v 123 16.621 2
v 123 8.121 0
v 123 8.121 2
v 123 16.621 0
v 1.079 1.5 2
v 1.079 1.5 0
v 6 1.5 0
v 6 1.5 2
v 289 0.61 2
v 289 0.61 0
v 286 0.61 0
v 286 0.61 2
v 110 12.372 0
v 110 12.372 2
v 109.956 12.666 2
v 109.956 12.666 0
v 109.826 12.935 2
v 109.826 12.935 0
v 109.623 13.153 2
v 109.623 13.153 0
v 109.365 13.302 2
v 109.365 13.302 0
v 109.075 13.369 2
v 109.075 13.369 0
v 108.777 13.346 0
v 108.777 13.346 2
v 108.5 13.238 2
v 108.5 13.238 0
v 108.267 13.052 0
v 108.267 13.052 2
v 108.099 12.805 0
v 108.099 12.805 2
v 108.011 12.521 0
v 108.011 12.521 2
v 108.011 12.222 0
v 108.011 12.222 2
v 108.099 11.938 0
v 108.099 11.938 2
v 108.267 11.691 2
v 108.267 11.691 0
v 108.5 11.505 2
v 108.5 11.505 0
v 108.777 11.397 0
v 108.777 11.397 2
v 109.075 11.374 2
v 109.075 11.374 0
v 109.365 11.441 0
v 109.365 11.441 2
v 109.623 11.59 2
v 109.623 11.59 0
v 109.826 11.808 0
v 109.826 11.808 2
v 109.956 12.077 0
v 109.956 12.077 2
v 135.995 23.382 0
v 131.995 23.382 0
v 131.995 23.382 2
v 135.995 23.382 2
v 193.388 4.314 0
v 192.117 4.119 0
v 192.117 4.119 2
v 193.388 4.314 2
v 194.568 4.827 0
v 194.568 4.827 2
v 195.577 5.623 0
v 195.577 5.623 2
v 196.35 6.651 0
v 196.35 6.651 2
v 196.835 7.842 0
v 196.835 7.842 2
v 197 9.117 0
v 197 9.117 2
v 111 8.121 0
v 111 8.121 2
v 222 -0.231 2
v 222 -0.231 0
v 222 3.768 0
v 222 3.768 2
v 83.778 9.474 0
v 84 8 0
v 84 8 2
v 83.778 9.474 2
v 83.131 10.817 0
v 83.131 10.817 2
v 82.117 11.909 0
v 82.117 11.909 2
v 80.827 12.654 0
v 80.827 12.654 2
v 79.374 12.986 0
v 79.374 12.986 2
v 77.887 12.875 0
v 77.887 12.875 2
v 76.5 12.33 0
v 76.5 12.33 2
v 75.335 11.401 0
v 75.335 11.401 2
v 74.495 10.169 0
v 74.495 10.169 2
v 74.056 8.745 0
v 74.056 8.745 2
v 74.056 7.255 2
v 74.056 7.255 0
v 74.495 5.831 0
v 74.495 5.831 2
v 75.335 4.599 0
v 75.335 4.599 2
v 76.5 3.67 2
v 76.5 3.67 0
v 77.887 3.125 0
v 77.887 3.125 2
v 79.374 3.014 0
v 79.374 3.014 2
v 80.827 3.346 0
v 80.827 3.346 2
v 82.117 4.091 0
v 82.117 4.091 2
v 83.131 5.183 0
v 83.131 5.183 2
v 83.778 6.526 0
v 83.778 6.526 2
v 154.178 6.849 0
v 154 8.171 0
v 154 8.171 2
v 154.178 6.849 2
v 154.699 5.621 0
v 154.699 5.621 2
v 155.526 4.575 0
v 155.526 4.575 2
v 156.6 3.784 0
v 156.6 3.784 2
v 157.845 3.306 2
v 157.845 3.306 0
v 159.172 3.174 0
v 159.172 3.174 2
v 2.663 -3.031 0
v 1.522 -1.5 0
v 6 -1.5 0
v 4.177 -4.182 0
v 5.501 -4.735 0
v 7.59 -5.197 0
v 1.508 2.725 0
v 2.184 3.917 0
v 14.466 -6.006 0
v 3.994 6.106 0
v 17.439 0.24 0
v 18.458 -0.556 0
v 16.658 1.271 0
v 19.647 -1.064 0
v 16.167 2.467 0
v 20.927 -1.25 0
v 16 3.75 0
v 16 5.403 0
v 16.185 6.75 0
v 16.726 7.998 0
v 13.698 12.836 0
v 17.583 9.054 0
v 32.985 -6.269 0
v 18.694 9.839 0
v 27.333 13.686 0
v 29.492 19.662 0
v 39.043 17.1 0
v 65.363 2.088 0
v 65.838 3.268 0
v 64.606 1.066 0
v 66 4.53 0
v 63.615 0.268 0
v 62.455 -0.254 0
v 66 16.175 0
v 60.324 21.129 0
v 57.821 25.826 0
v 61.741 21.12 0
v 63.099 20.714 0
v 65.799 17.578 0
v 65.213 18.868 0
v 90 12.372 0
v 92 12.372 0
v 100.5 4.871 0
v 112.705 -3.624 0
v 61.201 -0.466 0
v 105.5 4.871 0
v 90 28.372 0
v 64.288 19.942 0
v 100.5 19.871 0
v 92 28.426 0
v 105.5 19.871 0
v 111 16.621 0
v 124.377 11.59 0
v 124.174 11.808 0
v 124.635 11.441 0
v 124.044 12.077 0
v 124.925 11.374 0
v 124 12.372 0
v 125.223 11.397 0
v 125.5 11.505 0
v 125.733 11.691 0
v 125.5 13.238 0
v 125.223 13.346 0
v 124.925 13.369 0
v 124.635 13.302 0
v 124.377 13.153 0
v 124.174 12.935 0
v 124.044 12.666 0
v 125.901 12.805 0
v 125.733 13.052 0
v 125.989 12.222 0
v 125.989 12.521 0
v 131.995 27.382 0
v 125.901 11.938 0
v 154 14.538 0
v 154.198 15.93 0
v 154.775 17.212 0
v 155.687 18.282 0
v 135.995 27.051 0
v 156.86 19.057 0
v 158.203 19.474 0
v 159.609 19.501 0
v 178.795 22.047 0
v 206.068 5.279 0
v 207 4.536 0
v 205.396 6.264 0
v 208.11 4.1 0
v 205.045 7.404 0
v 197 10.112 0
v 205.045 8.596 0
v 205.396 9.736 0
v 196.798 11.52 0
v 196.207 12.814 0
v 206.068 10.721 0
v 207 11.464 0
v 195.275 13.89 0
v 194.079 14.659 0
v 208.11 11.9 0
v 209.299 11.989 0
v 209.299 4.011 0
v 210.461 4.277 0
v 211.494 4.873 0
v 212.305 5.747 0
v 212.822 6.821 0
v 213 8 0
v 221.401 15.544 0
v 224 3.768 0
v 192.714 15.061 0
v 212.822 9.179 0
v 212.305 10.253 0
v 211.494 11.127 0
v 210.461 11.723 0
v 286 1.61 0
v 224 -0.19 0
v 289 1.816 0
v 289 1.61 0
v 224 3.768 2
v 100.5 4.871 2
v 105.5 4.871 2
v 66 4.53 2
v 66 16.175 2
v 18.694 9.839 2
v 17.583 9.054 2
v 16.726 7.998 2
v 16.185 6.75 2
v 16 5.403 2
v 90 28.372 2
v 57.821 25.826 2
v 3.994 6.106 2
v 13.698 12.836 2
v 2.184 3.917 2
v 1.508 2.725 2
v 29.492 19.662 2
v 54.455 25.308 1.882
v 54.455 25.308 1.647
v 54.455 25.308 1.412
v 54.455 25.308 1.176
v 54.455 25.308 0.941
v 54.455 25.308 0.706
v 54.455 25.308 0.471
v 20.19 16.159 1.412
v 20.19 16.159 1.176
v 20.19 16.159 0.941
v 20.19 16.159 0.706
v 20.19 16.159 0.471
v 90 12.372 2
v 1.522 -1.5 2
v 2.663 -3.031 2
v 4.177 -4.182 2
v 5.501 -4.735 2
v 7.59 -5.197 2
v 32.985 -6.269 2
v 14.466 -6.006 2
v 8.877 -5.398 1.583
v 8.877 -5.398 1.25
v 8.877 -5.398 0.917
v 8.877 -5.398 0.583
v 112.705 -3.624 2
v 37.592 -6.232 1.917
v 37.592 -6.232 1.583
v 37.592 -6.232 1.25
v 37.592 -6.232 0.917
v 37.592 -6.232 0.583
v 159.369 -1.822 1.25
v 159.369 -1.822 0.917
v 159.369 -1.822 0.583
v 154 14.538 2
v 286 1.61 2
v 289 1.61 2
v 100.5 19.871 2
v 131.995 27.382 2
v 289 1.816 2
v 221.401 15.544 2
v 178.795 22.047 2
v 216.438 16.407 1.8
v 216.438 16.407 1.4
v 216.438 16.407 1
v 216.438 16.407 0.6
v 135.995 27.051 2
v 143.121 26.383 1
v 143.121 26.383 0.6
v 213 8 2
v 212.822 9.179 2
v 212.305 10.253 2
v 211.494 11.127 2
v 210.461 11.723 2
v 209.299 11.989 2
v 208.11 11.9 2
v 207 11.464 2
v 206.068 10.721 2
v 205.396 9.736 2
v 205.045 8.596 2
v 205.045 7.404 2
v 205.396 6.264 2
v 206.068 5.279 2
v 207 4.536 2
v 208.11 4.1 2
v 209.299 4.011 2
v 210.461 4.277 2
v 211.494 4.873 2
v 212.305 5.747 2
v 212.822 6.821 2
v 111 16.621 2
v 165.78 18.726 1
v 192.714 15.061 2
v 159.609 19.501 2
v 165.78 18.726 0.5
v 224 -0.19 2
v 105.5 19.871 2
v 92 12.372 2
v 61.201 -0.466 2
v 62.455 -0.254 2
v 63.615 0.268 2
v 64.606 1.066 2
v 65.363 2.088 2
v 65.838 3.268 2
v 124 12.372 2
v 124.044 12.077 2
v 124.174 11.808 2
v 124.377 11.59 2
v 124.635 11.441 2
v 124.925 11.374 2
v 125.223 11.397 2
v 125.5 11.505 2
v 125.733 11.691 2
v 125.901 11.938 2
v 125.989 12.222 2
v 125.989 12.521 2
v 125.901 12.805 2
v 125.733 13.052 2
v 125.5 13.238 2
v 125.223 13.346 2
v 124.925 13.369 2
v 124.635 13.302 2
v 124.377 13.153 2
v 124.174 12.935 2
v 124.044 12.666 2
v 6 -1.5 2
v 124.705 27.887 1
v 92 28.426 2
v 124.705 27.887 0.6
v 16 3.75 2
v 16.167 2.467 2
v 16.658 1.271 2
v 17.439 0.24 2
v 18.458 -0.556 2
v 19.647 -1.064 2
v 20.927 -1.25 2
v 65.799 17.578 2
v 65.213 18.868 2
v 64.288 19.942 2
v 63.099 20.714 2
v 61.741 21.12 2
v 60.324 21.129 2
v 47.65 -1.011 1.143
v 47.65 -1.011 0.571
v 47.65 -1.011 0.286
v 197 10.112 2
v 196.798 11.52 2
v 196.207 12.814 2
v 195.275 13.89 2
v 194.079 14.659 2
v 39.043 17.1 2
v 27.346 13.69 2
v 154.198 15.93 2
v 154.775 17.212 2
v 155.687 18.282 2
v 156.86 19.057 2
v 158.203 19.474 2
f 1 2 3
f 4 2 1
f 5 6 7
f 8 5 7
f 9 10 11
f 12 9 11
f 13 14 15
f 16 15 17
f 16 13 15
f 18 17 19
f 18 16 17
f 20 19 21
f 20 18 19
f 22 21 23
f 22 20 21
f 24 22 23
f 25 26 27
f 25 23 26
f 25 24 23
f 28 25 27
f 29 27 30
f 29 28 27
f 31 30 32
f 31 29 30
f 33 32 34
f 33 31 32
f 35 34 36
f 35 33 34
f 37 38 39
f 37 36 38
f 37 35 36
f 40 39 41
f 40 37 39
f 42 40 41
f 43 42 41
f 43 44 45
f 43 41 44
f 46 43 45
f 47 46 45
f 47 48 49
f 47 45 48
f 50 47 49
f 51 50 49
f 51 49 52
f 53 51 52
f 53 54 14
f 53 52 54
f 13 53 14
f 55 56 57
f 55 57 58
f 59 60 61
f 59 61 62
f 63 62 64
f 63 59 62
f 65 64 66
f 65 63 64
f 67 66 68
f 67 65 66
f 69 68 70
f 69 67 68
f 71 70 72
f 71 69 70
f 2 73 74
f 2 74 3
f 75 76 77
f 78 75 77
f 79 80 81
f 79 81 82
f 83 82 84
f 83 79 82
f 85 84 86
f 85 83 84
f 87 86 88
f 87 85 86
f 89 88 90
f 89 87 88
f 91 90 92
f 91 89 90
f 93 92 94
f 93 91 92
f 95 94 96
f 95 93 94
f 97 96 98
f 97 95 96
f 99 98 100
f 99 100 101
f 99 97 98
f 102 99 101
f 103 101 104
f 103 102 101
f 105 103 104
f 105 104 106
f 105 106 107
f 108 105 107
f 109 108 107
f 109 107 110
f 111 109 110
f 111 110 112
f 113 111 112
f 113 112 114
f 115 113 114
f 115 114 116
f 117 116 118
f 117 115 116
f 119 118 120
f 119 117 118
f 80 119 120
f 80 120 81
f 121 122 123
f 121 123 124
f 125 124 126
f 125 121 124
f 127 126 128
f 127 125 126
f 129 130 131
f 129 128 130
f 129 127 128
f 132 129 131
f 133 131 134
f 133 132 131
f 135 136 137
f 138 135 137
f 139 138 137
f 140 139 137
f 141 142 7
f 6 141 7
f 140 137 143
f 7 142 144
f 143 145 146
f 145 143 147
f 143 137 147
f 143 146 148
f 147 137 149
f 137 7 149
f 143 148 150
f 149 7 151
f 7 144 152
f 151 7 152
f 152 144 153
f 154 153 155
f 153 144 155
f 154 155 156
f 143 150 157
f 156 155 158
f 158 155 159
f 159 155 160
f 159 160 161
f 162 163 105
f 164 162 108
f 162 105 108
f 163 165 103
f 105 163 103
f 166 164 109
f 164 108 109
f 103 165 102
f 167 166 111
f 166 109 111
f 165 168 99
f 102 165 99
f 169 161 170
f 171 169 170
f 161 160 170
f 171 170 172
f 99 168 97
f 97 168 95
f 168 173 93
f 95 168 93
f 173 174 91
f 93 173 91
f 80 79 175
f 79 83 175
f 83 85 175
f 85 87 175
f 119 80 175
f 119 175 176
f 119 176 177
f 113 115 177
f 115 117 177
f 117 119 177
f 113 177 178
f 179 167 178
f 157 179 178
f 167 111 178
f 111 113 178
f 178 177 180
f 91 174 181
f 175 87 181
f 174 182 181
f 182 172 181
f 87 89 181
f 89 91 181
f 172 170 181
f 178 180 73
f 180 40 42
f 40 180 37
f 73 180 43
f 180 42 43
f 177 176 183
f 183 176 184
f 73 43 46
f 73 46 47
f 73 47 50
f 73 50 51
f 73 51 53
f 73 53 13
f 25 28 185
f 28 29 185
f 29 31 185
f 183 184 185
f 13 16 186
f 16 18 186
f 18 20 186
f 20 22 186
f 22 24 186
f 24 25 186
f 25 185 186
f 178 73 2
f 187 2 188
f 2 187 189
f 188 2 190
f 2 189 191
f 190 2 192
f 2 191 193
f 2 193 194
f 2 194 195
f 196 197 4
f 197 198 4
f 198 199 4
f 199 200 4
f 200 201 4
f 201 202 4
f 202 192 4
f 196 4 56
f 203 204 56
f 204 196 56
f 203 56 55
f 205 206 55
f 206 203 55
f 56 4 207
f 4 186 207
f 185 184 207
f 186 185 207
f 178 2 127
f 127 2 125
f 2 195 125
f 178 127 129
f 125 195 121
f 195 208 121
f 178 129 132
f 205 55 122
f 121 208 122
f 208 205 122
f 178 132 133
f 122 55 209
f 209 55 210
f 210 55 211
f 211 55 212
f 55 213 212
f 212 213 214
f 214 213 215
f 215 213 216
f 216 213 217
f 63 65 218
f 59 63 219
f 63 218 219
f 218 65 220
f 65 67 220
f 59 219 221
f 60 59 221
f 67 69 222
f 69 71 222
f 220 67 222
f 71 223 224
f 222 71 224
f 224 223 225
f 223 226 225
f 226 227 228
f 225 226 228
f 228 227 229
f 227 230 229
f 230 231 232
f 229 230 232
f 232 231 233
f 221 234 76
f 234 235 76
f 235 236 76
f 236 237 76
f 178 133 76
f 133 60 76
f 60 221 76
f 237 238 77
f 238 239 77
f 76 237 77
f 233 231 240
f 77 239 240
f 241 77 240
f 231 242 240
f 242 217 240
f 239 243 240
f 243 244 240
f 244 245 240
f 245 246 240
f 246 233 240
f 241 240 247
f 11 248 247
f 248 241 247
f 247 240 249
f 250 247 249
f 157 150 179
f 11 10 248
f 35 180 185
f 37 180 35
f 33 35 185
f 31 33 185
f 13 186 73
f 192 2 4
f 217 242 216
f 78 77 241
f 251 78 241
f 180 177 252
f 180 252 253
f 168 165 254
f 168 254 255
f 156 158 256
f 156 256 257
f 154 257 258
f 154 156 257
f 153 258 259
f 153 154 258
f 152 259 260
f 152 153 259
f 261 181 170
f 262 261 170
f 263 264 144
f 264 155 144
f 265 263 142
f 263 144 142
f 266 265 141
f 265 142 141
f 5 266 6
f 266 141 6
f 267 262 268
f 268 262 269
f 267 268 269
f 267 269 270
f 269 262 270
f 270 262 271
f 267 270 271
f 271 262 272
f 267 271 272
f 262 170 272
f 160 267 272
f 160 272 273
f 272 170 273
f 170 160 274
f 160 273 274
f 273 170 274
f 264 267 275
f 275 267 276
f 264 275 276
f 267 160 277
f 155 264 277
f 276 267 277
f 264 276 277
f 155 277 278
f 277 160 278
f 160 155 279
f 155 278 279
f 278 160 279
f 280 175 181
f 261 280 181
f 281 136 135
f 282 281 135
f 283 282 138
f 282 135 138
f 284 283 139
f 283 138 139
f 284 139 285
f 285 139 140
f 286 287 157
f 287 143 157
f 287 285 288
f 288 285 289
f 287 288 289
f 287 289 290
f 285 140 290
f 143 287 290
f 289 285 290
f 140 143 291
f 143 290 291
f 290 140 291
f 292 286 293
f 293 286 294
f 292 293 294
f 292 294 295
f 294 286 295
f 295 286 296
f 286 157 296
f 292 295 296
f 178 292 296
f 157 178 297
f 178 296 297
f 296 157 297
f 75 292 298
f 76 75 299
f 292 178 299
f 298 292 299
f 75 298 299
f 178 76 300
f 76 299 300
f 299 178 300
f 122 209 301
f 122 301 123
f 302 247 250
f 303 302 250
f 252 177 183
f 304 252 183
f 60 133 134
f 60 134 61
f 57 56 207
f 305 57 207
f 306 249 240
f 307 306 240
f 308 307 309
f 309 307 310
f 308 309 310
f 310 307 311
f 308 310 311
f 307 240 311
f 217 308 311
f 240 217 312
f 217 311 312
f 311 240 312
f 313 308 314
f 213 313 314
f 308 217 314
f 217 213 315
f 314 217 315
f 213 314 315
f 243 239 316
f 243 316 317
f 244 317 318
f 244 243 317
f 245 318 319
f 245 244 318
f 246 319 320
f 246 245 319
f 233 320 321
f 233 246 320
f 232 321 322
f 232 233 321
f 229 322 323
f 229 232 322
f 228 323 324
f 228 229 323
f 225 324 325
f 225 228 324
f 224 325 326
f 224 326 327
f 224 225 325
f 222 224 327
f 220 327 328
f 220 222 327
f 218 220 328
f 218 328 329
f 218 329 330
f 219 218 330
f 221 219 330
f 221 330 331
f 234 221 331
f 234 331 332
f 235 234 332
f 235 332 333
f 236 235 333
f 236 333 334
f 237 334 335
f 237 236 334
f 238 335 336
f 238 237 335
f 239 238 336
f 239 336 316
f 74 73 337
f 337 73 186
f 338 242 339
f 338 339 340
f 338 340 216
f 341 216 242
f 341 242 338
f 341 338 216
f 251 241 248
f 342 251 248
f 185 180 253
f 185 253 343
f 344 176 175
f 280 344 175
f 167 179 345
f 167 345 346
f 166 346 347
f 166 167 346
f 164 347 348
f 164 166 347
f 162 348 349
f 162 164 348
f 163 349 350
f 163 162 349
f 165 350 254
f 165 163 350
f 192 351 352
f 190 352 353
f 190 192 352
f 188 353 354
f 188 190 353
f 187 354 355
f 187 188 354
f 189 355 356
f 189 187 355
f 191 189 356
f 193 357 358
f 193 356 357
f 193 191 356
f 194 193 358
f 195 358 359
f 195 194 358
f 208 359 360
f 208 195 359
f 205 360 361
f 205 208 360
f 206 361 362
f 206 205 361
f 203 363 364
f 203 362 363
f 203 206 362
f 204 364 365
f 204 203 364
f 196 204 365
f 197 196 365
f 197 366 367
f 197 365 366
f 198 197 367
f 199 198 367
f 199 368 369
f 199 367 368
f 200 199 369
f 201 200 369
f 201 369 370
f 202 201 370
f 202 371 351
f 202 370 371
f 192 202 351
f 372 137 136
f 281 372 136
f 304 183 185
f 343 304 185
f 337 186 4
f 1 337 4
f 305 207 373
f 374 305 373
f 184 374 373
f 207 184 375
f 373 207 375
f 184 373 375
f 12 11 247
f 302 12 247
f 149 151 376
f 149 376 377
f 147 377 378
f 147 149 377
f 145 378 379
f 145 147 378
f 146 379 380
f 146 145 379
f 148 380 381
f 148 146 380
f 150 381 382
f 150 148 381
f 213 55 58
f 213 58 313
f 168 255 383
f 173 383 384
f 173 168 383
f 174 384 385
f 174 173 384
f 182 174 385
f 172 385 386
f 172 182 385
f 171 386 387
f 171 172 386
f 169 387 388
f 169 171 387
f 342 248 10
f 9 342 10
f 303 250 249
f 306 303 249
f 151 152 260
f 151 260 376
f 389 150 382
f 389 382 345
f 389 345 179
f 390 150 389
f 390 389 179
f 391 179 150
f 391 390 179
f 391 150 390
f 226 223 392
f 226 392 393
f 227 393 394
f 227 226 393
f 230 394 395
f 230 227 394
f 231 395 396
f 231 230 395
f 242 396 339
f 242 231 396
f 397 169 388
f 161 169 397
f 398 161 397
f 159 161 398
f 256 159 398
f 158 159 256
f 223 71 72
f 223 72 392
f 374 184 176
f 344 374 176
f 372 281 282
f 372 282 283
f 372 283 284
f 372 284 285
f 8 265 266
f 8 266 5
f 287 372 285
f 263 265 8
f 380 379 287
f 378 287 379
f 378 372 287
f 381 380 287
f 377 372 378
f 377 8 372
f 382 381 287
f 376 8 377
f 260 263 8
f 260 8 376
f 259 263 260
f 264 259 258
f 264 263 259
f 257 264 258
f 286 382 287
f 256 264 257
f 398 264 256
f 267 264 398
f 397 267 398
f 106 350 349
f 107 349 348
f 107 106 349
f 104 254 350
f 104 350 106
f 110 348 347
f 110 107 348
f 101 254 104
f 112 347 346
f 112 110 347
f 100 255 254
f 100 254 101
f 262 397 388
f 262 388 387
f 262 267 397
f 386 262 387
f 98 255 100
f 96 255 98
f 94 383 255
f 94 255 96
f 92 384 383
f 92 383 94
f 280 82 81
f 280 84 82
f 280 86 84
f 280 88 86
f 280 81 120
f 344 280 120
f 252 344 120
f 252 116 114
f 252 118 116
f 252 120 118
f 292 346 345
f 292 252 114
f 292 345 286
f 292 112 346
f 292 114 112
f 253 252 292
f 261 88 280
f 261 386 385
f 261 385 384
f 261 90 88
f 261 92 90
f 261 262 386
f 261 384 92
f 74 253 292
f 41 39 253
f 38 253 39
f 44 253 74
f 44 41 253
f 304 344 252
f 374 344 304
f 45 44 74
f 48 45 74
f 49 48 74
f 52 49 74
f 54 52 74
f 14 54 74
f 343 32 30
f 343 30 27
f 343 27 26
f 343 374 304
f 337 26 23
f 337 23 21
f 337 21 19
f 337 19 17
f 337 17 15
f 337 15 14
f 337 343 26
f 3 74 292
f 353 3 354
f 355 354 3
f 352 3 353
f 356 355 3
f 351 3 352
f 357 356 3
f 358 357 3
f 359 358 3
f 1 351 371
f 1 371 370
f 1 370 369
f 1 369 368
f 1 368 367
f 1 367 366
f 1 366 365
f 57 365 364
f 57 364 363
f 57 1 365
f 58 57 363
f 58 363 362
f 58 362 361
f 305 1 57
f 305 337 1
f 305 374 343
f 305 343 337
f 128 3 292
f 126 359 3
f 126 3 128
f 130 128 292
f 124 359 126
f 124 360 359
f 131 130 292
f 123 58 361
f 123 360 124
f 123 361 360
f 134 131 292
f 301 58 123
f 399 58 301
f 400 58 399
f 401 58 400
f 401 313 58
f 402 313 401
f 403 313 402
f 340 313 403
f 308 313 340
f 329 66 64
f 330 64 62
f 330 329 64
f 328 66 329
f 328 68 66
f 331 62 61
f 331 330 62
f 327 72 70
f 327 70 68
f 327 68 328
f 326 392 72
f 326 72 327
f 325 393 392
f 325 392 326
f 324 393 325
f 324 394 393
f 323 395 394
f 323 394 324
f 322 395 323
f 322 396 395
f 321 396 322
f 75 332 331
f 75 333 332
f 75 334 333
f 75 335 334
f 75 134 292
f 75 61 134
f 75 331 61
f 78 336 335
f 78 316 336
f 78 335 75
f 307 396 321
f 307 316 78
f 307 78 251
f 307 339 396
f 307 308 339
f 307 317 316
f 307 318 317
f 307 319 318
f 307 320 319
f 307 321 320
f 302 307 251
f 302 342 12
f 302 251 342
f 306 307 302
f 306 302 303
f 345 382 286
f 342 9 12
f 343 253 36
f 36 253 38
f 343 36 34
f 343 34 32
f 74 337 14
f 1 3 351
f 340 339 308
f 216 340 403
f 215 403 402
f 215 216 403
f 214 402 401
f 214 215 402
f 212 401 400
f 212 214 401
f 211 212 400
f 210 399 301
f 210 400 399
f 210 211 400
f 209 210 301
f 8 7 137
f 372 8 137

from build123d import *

# Parameters (mm, degrees)
SKETCH_1_R          = 5
SKETCH_1_R_2        = 4
EXTRUDE_1_DEPTH     = 2
SKETCH_3_W          = 5
SKETCH_3_H          = 15
SKETCH_3_W_2        = 12
SKETCH_3_H_2        = 8.5
SKETCH_3_R          = 1
SKETCH_3_W_3        = 4
SKETCH_3_H_3        = 4
CUT_EXTRUDE_2_DEPTH = 291.413778556


with BuildPart() as part:
    # 草图1 → 凸台-拉伸1 (new body)
    with BuildSketch(Plane.XY):
        with BuildLine():
            Line((90, 12.3715), (90, 28.372426217))
            add(Edge.make_bspline(
                [(90, 28.372426217), (89.259446982, 28.350928743), (82.363996343, 28.13322439), (72.403347361, 27.586524792), (60.185862052, 26.226268085), (51.080991088, 24.79810862), (42.033943524, 23.000087944), (34.581994337, 21.174922903), (28.697351661, 19.44563851), (24.361981086, 17.983441115), (20.174828998, 16.207949367), (16.078941989, 14.139912989), (12.040296713, 11.946766626), (8.14011433, 9.56039573), (5.153679337, 7.316395724), (3.100060439, 5.200618052), (1.813825976, 3.470730924), (1.237398467, 2.180506339), (1.085380705, 1.529058937), (1.078882286, 1.5)],
                knots=[0.345773533, 0.345773533, 0.345773533, 0.345773533, 0.349398211, 0.379527288, 0.394591827, 0.409656366, 0.424720905, 0.439785444, 0.447317713, 0.454849983, 0.462382252, 0.469914522, 0.477446791, 0.484979061, 0.49251133, 0.496277465, 0.5000436, 0.503809734, 0.503985678, 0.503985678, 0.503985678, 0.503985678], degree=3))
            Line((1.078882286, 1.5), (6, 1.5))
            Line((6, 1.5), (6, -1.5))
            Line((6, -1.5), (1.522379628, -1.5))
            add(Edge.make_bspline(
                [(1.522379628, -1.5), (1.617903461, -1.678770523), (2.068186491, -2.42442122), (3.143139608, -3.601090845), (4.854253, -4.619355756), (6.927567017, -5.105597911), (9.209034621, -5.454839075), (12.219971865, -5.84289763), (16.020132359, -6.14266222), (20.609524976, -6.2611368), (25.231457517, -6.286948592), (31.397380169, -6.280305851), (39.107274969, -6.240736398), (48.336813051, -6.022096429), (57.579935967, -5.612990736), (66.840654471, -5.242934226), (76.096556555, -4.921715721), (88.435998513, -4.515955408), (103.853120896, -3.973102953), (122.354625015, -3.248110744), (140.857835973, -2.495489966), (159.368527813, -1.804089638), (177.884173919, -1.222493213), (196.4033921, -0.774877257), (211.106034353, -0.46143934), (219.638958118, -0.28014938), (222, -0.231405833)],
                knots=[0.510182255, 0.510182255, 0.510182255, 0.510182255, 0.511342004, 0.515108139, 0.518874273, 0.522640408, 0.526406543, 0.530172677, 0.537704947, 0.545237216, 0.552769486, 0.560301755, 0.575366294, 0.590430833, 0.605495372, 0.620559911, 0.63562445, 0.650688989, 0.680818067, 0.710947144, 0.741076222, 0.7712053, 0.801334378, 0.831463456, 0.861592533, 0.873117312, 0.873117312, 0.873117312, 0.873117312], degree=3))
            Line((222, -0.231405833), (222, 3.768284765))
            Line((222, 3.768284765), (224, 3.768284765))
            Line((224, 3.768284765), (224, -0.190486213))
            add(Edge.make_bspline(
                [(224, -0.190486213), (227.14486696, -0.126773539), (236.463303784, 0.052517956), (251.961175933, 0.256656825), (270.471854229, 0.429163033), (282.824771355, 0.587434741), (289, 0.610062865)],
                knots=[0.8763714, 0.8763714, 0.8763714, 0.8763714, 0.891721611, 0.921850689, 0.951979767, 0.982108845, 0.982108845, 0.982108845, 0.982108845], degree=3))
            Line((289, 0.610062865), (286, 0.610062865))
            Line((286, 0.610062865), (286, 1.610062865))
            Line((286, 1.610062865), (289, 1.610062865))
            Line((289, 1.610062865), (289, 1.816246039))
            add(Edge.make_bspline(
                [(289, 1.816246039), (276.957314444, 4.502285023), (258.861554155, 8.397620333), (234.648247971, 13.152786595), (216.448478593, 16.478914183), (198.182873559, 19.371550405), (179.850571346, 21.924148488), (161.503162682, 24.358614825), (143.127892269, 26.473190985), (124.712239059, 28.043780086), (107.661076739, 28.627794226), (96.749283398, 28.541845307), (92, 28.425883181)],
                knots=[0.017978355, 0.017978355, 0.017978355, 0.017978355, 0.07823651, 0.108365588, 0.138494666, 0.168623744, 0.198752821, 0.228881899, 0.259010977, 0.289140055, 0.319269133, 0.342510787, 0.342510787, 0.342510787, 0.342510787], degree=3))
            Line((92, 28.425883181), (92, 12.3715))
            Line((92, 12.3715), (90, 12.3715))
        make_face()
        with Locations((79, 8)):
            Circle(SKETCH_1_R, mode=Mode.SUBTRACT)
        with Locations((209, 8)):
            Circle(SKETCH_1_R_2, mode=Mode.SUBTRACT)
    extrude(amount=EXTRUDE_1_DEPTH)

    # 草图3 → 切除-拉伸2 (cut, through all)
    with BuildSketch(Plane.XY):
        with Locations((103, 12.3715)):
            Rectangle(SKETCH_3_W, SKETCH_3_H)
        with Locations((117, 12.3715)):
            Rectangle(SKETCH_3_W_2, SKETCH_3_H_2)
        with Locations((109, 12.3715)):
            Circle(SKETCH_3_R)
        with Locations(Location((125, 12.3715, 0), (0, 0, 180))):
            Circle(SKETCH_3_R)
        with Locations((133.995432672, 25.382316812)):
            Rectangle(SKETCH_3_W_3, SKETCH_3_H_3)
        with BuildLine():
            add(Edge.make_bspline(
                [(192.714090476, 15.060767244), (191.944613201, 15.171800732), (191.174825659, 15.282099728), (186.308954619, 15.974755997), (182.203786583, 16.539615577), (173.988030512, 17.653320176), (169.883033971, 18.199812389), (163.72254432, 18.989569369), (161.665308348, 19.2482867), (159.608604404, 19.500505924)],
                knots=[0.488248297, 0.488248297, 0.488248297, 0.488248297, 0.5, 0.5, 0.5625, 0.5625, 0.625, 0.625, 0.656347088, 0.656347088, 0.656347088, 0.656347088], degree=3))
            ThreePointArc((159.608604404, 19.500505924), (155.686619703, 18.282214891), (154, 14.537684078))
            Line((154, 14.537684078), (154, 8.170617563))
            ThreePointArc((154, 8.170617563), (155.525809704, 4.574786396), (159.172000715, 3.173576864))
            add(Edge.make_bspline(
                [(159.172000715, 3.173576864), (161.473677828, 3.252801775), (163.775686209, 3.329549926), (170.732455506, 3.552774746), (175.388689917, 3.690754395), (184.07020031, 3.924521784), (188.094738333, 4.024115619), (192.117455336, 4.118639618)],
                knots=[0.71908585, 0.71908585, 0.71908585, 0.71908585, 0.75, 0.75, 0.8125, 0.8125, 0.866546799, 0.866546799, 0.866546799, 0.866546799], degree=3))
            ThreePointArc((192.117455336, 4.118639618), (195.576819584, 5.623499462), (197, 9.117259852))
            Line((197, 9.117259852), (197, 10.112022474))
            ThreePointArc((197, 10.112022474), (195.77958016, 13.385365385), (192.714090476, 15.060767244))
        make_face()
        with BuildLine():
            add(Edge.make_bspline(
                [(20.926650195, -1.249889668), (21.774172276, -1.262324122), (22.628944162, -1.270076322), (24.631357544, -1.281688823), (25.78455057, -1.283642157), (29.246278981, -1.283863887), (31.564498991, -1.277624199), (36.178821914, -1.249716978), (38.477208261, -1.225805817), (43.065916773, -1.143353772), (45.357830447, -1.085798853), (49.942071524, -0.935363079), (52.243600435, -0.841029597), (56.765262426, -0.649905427), (58.983967724, -0.555595534), (61.201389309, -0.466209999)],
                knots=[0.097664849, 0.097664849, 0.097664849, 0.097664849, 0.109375, 0.109375, 0.125, 0.125, 0.15625, 0.15625, 0.1875, 0.1875, 0.21875, 0.21875, 0.25, 0.25, 0.279748342, 0.279748342, 0.279748342, 0.279748342], degree=3))
            ThreePointArc((61.201389309, -0.466209999), (64.606032899, 1.066132334), (66, 4.529732589))
            Line((66, 4.529732589), (66, 16.175207171))
            ThreePointArc((66, 16.175207171), (64.287676463, 19.942325894), (60.32352661, 21.129234195))
            add(Edge.make_bspline(
                [(60.32352661, 21.129234195), (59.143282742, 20.968071656), (57.964431768, 20.796736398), (53.109249428, 20.046773379), (49.445857595, 19.384253181), (42.158673028, 17.868714577), (38.533379611, 17.019586343), (33.148990447, 15.546220745), (31.362942012, 15.022439399), (27.821005995, 13.880218625), (26.067238608, 13.253271835), (22.635818059, 11.812670552), (20.957942753, 11.004847704), (19.099592195, 10.049689097), (18.896441621, 9.944700093), (18.693547477, 9.839213217)],
                knots=[0.029920383, 0.029920383, 0.029920383, 0.029920383, 0.033494004, 0.033494004, 0.044658672, 0.044658672, 0.05582334, 0.05582334, 0.061405674, 0.061405674, 0.066988008, 0.066988008, 0.072570342, 0.072570342, 0.073256353, 0.073256353, 0.073256353, 0.073256353], degree=3))
            ThreePointArc((18.693547477, 9.839213217), (16.726110517, 7.997937304), (16, 5.402967421))
            Line((16, 5.402967421), (16, 3.749572283))
            ThreePointArc((16, 3.749572283), (17.43862744, 0.240067263), (20.926650195, -1.249889668))
        make_face()
    extrude(amount=CUT_EXTRUDE_2_DEPTH, mode=Mode.SUBTRACT)


solid = part.part
